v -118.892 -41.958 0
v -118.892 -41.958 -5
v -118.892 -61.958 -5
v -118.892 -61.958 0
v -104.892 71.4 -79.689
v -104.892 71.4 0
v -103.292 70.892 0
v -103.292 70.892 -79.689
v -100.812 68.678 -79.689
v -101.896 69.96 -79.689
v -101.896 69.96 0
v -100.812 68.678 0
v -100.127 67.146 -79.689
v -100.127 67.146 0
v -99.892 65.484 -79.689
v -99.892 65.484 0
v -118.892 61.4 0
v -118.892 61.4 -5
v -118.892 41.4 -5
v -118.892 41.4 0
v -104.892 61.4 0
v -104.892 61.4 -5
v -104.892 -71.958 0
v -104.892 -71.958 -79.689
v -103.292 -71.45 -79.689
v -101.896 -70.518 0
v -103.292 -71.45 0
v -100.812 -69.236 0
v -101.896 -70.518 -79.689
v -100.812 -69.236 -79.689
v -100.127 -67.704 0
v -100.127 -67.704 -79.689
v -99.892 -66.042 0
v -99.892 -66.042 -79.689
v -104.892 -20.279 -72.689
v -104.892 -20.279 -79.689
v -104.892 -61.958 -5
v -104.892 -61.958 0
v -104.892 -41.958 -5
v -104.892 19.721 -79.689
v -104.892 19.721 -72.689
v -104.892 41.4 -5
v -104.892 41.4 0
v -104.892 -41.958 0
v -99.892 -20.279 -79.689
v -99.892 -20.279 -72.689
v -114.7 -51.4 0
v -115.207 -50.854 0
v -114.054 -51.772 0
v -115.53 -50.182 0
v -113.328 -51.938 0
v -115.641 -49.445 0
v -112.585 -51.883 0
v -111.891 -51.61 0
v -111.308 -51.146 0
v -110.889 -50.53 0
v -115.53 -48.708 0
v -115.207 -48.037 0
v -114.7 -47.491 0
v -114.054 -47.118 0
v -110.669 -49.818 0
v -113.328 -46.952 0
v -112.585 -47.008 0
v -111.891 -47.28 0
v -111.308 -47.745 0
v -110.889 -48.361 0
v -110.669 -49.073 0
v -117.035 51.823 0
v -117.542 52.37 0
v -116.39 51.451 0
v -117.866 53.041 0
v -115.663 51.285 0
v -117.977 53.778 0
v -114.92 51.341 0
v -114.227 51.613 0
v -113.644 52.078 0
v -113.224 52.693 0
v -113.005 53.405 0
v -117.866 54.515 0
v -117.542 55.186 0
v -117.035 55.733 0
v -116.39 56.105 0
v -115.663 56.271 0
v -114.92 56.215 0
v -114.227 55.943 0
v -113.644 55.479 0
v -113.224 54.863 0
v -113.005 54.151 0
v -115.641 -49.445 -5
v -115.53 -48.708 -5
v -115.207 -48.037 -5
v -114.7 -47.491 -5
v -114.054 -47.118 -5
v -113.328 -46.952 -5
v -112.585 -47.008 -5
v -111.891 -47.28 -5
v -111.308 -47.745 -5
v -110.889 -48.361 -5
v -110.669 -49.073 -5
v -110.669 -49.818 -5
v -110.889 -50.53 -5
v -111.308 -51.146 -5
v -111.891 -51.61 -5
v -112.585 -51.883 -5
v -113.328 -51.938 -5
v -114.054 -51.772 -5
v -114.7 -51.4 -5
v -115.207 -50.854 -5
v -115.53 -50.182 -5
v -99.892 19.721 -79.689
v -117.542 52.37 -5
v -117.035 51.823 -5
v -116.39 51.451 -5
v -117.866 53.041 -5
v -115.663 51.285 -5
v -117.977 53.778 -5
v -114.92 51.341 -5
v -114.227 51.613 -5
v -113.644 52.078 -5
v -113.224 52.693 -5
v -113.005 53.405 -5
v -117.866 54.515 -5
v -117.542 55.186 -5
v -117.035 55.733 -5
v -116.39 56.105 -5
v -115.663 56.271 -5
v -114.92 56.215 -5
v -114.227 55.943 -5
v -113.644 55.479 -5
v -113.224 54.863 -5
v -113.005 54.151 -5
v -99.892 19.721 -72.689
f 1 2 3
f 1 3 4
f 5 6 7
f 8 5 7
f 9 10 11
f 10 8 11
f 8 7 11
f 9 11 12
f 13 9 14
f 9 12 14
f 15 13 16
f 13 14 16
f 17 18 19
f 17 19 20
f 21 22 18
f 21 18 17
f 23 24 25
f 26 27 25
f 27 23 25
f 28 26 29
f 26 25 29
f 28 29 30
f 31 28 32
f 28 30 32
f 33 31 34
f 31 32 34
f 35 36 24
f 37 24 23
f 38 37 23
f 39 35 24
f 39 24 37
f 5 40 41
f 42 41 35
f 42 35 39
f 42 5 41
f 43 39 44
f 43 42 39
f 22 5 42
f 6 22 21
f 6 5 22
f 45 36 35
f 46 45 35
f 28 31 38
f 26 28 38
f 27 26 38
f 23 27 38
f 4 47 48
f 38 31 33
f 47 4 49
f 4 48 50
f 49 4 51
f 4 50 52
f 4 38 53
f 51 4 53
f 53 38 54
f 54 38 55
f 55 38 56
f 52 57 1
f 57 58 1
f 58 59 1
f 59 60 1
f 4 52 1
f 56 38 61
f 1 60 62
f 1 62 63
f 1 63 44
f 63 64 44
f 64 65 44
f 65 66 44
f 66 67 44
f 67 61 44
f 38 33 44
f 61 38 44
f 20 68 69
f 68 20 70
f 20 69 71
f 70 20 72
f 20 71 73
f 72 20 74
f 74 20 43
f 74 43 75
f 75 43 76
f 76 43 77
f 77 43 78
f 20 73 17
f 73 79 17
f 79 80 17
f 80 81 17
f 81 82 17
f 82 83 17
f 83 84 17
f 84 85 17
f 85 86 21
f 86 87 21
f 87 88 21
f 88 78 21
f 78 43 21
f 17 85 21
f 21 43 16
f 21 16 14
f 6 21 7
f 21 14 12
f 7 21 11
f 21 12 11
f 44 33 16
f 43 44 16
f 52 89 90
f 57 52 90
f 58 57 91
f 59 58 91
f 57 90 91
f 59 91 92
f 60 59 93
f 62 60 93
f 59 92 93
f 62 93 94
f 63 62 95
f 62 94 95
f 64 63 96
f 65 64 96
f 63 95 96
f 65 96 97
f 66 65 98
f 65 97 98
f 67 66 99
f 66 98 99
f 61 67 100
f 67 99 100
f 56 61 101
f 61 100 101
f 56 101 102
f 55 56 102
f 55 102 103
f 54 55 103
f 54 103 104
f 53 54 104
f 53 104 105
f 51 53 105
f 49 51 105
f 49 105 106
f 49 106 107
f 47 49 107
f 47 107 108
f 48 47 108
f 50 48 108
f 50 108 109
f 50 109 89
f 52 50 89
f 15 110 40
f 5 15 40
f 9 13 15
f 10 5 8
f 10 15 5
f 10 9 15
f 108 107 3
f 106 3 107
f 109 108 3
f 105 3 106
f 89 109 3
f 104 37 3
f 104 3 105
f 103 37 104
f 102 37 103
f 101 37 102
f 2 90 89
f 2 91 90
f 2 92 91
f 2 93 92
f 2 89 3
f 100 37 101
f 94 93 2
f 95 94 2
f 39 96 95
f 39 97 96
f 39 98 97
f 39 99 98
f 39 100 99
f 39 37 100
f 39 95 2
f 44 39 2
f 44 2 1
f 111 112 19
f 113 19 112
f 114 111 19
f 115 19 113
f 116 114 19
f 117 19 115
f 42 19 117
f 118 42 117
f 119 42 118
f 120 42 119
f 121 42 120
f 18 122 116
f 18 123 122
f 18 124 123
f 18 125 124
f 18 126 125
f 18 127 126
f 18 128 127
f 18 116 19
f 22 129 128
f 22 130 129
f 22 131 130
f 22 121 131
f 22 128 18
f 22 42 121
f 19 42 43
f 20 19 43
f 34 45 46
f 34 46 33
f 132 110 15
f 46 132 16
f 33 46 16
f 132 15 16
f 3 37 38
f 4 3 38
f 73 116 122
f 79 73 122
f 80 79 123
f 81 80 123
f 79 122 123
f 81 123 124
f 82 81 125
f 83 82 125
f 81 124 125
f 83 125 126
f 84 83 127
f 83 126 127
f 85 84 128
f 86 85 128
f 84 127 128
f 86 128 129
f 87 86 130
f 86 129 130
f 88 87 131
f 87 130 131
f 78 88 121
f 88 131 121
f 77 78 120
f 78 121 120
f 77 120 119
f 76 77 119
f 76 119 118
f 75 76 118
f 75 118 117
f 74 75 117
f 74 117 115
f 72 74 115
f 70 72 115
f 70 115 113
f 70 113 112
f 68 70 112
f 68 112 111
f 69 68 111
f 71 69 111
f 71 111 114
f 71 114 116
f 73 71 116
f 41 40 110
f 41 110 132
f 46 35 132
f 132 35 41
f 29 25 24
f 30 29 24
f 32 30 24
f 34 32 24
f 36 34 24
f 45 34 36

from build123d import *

# Parameters (mm, degrees)
CROQUIS2_W              = 200
CROQUIS2_H              = 150
CROQUIS2_R              = 2
CROQUIS2_R_2            = 2.5
CROQUIS2_W_2            = 31.297292299
CROQUIS2_H_2            = 43.768728426
CROQUIS2_H_3            = 43.768728427
CROQUIS2_W_3            = 23.573907934
CROQUIS2_H_4            = 45.323962431
SALIENTE_EXTRUIR1_DEPTH = 2
REDONDEO1_R             = 10
BOSS_EXTRUDE1_DEPTH     = 25
SKETCH3_W               = 62.040442094
SKETCH3_H               = 5.530821024
BOSS_EXTRUDE2_DEPTH     = 22
SKETCH8_W               = 62.040442094
SKETCH8_H               = 5.530821024
BOSS_EXTRUDE6_DEPTH     = 13
SKETCH2_W               = 200
SKETCH2_H               = 78.124132015
SKETCH2_W_2             = 62.040442094
SKETCH2_H_2             = 5.530821024
BOSS_EXTRUDE3_DEPTH     = 5
SKETCH4_W               = 62.040442094
SKETCH4_H               = 5.530821024
BOSS_EXTRUDE4_DEPTH     = 19
SKETCH5_W               = 7.442573222
SKETCH5_H               = 2.991451355
BOSS_EXTRUDE5_DEPTH     = 21
SKETCH6_R               = 2.5
CUT_EXTRUDE1_DEPTH      = 158.961544101
FILLET1_R               = 10
SKETCH10_W              = 79.68896036
SKETCH10_H              = 143.358595358
BOSS_EXTRUDE7_DEPTH     = 5
SKETCH11_W              = 5
SKETCH11_H              = 20
BOSS_EXTRUDE13_DEPTH    = 14
SKETCH12_R              = 2.5
CUT_EXTRUDE2_DEPTH      = 176.118897221
FILLET2_R               = 6
CUT_EXTRUDE3_DEPTH      = 222.270727407
SKETCH14_W              = 12
SKETCH14_H              = 2
CUT_EXTRUDE4_DEPTH      = 198.082327879
SKETCH15_W              = 7
SKETCH15_H              = 40
CUT_EXTRUDE5_DEPTH      = 10


with BuildPart() as part:
    # Croquis2 → Saliente-Extruir1 (new body)
    with BuildSketch(Plane.XY):
        with Locations((0.108263467, -0.36008145)):
            Rectangle(CROQUIS2_W, CROQUIS2_H)
        with Locations((89.108263467, -66.5)):
            Circle(CROQUIS2_R, mode=Mode.SUBTRACT)
        with Locations((-88.891736533, -66.5)):
            Circle(CROQUIS2_R, mode=Mode.SUBTRACT)
        with Locations(Location((89.108263467, 65.779837101, 0), (0, 0, 180))):
            Circle(CROQUIS2_R, mode=Mode.SUBTRACT)
        with Locations(Location((-88.891736533, 65.779837101, 0), (0, 0, 180))):
            Circle(CROQUIS2_R, mode=Mode.SUBTRACT)
        with Locations((-80.865436179, -59.36008145)):
            Circle(CROQUIS2_R_2, mode=Mode.SUBTRACT)
        with Locations((81.108263467, -59.36008145)):
            Circle(CROQUIS2_R_2, mode=Mode.SUBTRACT)
        with Locations(Location((81.108263467, 58.63991855, 0), (0, 0, 180))):
            Circle(CROQUIS2_R_2, mode=Mode.SUBTRACT)
        with Locations(Location((-80.865436179, 58.63991855, 0), (0, 0, 180))):
            Circle(CROQUIS2_R_2, mode=Mode.SUBTRACT)
        with BuildLine():
            Line((-62.091736533, 70.63991855), (64.108263467, 70.63991855))
            ThreePointArc((64.108263467, 70.63991855), (66.108263467, 68.63991855), (64.108263467, 66.63991855))
            Line((64.108263467, 66.63991855), (-62.091736533, 66.63991855))
            ThreePointArc((-62.091736533, 66.63991855), (-64.091736533, 68.63991855), (-62.091736533, 70.63991855))
        make_face(mode=Mode.SUBTRACT)
        Polygon((-71.391736533, -12.902447307), (-71.391736533, 12.182284408), (-79.241736533, 12.28991855), (-83.891736533, 12.28991855), (-83.891736533, -13.01008145), (-79.241736533, -13.01008145), align=None, mode=Mode.SUBTRACT)
        with BuildLine():
            Line((92.108263467, 45.478381757), (92.108263467, -46.198544657))
            ThreePointArc((92.108263467, -46.198544657), (90.807295546, -47.897576736), (89.108263467, -46.596608814))
            Line((89.108263467, -46.596608814), (89.108263467, 45.876445915))
            ThreePointArc((89.108263467, 45.876445915), (90.807295546, 47.177413836), (92.108263467, 45.478381757))
        make_face(mode=Mode.SUBTRACT)
        Polygon((84.108263467, 12.28991855), (84.108263467, -13.01008145), (79.458263467, -13.01008145), (71.608263467, -13.01008145), (71.608263467, 12.28991855), (79.458263467, 12.28991855), align=None, mode=Mode.SUBTRACT)
        with BuildLine():
            Line((-91.891736533, 45.478381757), (-91.891736533, -46.198544657))
            ThreePointArc((-91.891736533, -46.198544657), (-90.590768612, -47.897576736), (-88.891736533, -46.596608814))
            Line((-88.891736533, -46.596608814), (-88.891736533, 45.876445915))
            ThreePointArc((-88.891736533, 45.876445915), (-90.590768612, 47.177413836), (-91.891736533, 45.478381757))
        make_face(mode=Mode.SUBTRACT)
        with Locations((-30.011405388, 36.299005811)):
            Rectangle(CROQUIS2_W_2, CROQUIS2_H_2, mode=Mode.SUBTRACT)
        with BuildLine():
            Line((-62.091736533, -71.36008145), (64.108263467, -71.36008145))
            ThreePointArc((64.108263467, -71.36008145), (66.108263467, -69.36008145), (64.108263467, -67.36008145))
            Line((64.108263467, -67.36008145), (-62.091736533, -67.36008145))
            ThreePointArc((-62.091736533, -67.36008145), (-64.091736533, -69.36008145), (-62.091736533, -71.36008145))
        make_face(mode=Mode.SUBTRACT)
        with Locations((-30.011405388, -26.799059535)):
            Rectangle(CROQUIS2_W_2, CROQUIS2_H_3, mode=Mode.SUBTRACT)
        with Locations((12.982877294, -0.693345879)):
            Rectangle(CROQUIS2_W_3, CROQUIS2_H_4, mode=Mode.SUBTRACT)
    extrude(amount=SALIENTE_EXTRUIR1_DEPTH)

    # Redondeo1
    redondeo1_edges = [part.edges().sort_by_distance(p)[0] for p in [
        (100.108263467, -75.36008145, 1),
        (-99.891736533, -75.36008145, 1),
        (-99.891736533, 74.63991855, 1),
        (100.108263467, 74.63991855, 1),
    ]]
    fillet(redondeo1_edges, radius=REDONDEO1_R)

    # Sketch1 → Boss-Extrude1 (add)
    with BuildSketch(Plane.XY.offset(2)):
        Polygon((-67.071845217, 64.63991855), (-67.071845217, 60.63991855), (-8.841198185, 60.63991855), (-8.841198185, 3.63991855), (-67.071845217, 3.63991855), (-67.071845217, -0.36008145), (-8.841198185, -0.36008145), (-8.841198185, -53.36008145), (-67.071845217, -53.36008145), (-67.071845217, -57.574734434), (-5.031403123, -57.574734434), (-5.031403123, -40.931443482), (46.608263467, -40.931443482), (46.608263467, -36.931443482), (-5.031403123, -36.931443482), (-5.031403123, 30.068556518), (46.608263467, 30.068556518), (46.608263467, 34.068556518), (-5.031403123, 34.068556518), (-5.031403123, 64.63991855), align=None)
    extrude(amount=BOSS_EXTRUDE1_DEPTH)

    # Sketch3 → Boss-Extrude2 (add)
    with BuildSketch(Plane.XZ.offset(57.574734434)):
        with Locations((-36.05162417, 24.234589488)):
            Rectangle(SKETCH3_W, SKETCH3_H)
    extrude(amount=BOSS_EXTRUDE2_DEPTH)

    # Sketch8 → Boss-Extrude6 (add)
    with BuildSketch(Plane(origin=(0, 64.63991855, 0), x_dir=(1, 0, 0), z_dir=(0, 1, 0))):
        with Locations((-36.05162417, -24.234589488)):
            Rectangle(SKETCH8_W, SKETCH8_H)
    extrude(amount=BOSS_EXTRUDE6_DEPTH)

    # Sketch2 → Boss-Extrude3 (add)
    with BuildSketch(Plane.XZ.offset(75.36008145)):
        with Locations((0.108263467, 41.062066008)):
            Rectangle(SKETCH2_W, SKETCH2_H)
        with Locations((-36.05162417, 24.234589488)):
            Rectangle(SKETCH2_W_2, SKETCH2_H_2, mode=Mode.SUBTRACT)
    extrude(amount=-BOSS_EXTRUDE3_DEPTH)

    # Sketch4 → Boss-Extrude4 (add)
    with BuildSketch(Plane(origin=(0, 64.63991855, 0), x_dir=(1, 0, 0), z_dir=(0, 1, 0))):
        with Locations((-36.05162417, -24.234589488)):
            Rectangle(SKETCH4_W, SKETCH4_H)
    extrude(amount=BOSS_EXTRUDE4_DEPTH)

    # Sketch5 → Boss-Extrude5 (add)
    with BuildSketch(Plane.XZ.offset(75.36008145)):
        with Locations((-80.540187187, 3.495725678)):
            Rectangle(SKETCH5_W, SKETCH5_H)
        with Locations((80.756714122, 3.495725678)):
            Rectangle(SKETCH5_W, SKETCH5_H)
    extrude(amount=BOSS_EXTRUDE5_DEPTH)

    # Sketch6 → Cut-Extrude1 (cut, through all)
    with BuildSketch(Plane.XY.offset(4.991451355)):
        with Locations((-80.996023003, -59.284349751)):
            Circle(SKETCH6_R)
        with Locations((81.166025964, -59.051385225)):
            Circle(SKETCH6_R)
    extrude(amount=-CUT_EXTRUDE1_DEPTH, mode=Mode.SUBTRACT)

    # Fillet1
    # the kernel refuses this fillet: 10 mm, written as the material it takes off along each edge
    with BuildSketch(Plane(origin=(100.108263467, -70.36008145, 2), x_dir=(-1, 0, 0), z_dir=(0, 0, 1)), Plane(origin=(-99.891736533, -70.36008145, 101.77476711), x_dir=(1, 0, 0), z_dir=(0, 0, -1))) as fillet1_piece_1:
        with BuildLine():
            CenterArc((8.660254038, 10), FILLET1_R, 210, 60)
            Line((0, 5), (0, 0))
            Line((0, 0), (8.660254038, 0))
        make_face()
    extrude(amount=99.77476711, mode=Mode.SUBTRACT)


with BuildPart() as body_2:
    # Sketch10 → Boss-Extrude7 (new body)
    with BuildSketch(Plane.ZY.offset(99.891736533)):
        with Locations((-39.84448018, -0.278985798)):
            Rectangle(SKETCH10_W, SKETCH10_H)
    extrude(amount=BOSS_EXTRUDE7_DEPTH)

    # Sketch11 → Boss-Extrude13 (add)
    with BuildSketch(Plane.ZY.offset(104.891736533)):
        with Locations((-2.5, -51.958283477)):
            Rectangle(SKETCH11_W, SKETCH11_H)
        with Locations((-2.5, 51.400311881)):
            Rectangle(SKETCH11_W, SKETCH11_H)
    extrude(amount=BOSS_EXTRUDE13_DEPTH)


with BuildPart() as cut_extrude2_tool:
    # Sketch12 → Cut-Extrude2 (new, through all)
    with BuildSketch(Plane(origin=(0, 0, -5), x_dir=(-1, 0, 0), z_dir=(0, 0, -1))):
        with Locations((94.306850379, -54.336044589)):
            Circle(SKETCH12_R)
        with Locations((94.306850379, 53.778072993)):
            Circle(SKETCH12_R)
        with Locations((115.476622686, 53.778072993)):
            Circle(SKETCH12_R)
        with Locations((113.140977594, -49.445291065)):
            Circle(SKETCH12_R)
    extrude(amount=-CUT_EXTRUDE2_DEPTH)


with BuildPart() as part_1:
    add(part.part)

    # Cut-Extrude2: cut by cut_extrude2_tool
    add(cut_extrude2_tool.part, mode=Mode.SUBTRACT)

    # Sketch13 → Cut-Extrude3 (cut, through all)
    with BuildSketch(Plane.XY.offset(80.124132015)):
        Polygon((-88.891736533, 41.400311881), (-87.891736533, 41.400311881), (-87.891736533, 63.52554782), (-99.891736533, 63.52554782), (-99.891736533, 94.010082764), (108.48763668, 94.010082764), (108.48763668, -102.123784964), (-99.891736533, -102.123784964), (-99.891736533, -61.922986139), (-88.478309969, -61.922986139), (-88.478309969, -40.956005085), (-99.891736533, -40.956005085), (-99.891736533, 41.400311881), align=None)
    extrude(amount=-CUT_EXTRUDE3_DEPTH, mode=Mode.SUBTRACT)


with BuildPart() as body_2_1:
    add(body_2.part)

    # Cut-Extrude2: cut by cut_extrude2_tool
    add(cut_extrude2_tool.part, mode=Mode.SUBTRACT)

    # Fillet2
    # the kernel refuses this fillet: 6 mm, written as the material it takes off along each edge
    with BuildSketch(Plane(origin=(-99.891736533, -71.958283477, -94.479159818), x_dir=(0, 1, 0), z_dir=(0, 0, 1))) as fillet2_piece_1:
        with BuildLine():
            CenterArc((5.916079783, 6), FILLET2_R, 189.594068227, 80.405931773)
            Line((0, 5), (-0.118321596, 4.98))
            ThreePointArc((-0.118321596, 4.98), (-0.12, 2.5), (-0.12, 0))
            Line((-0.12, 0), (0, -0.12))
            Line((0, -0.12), (5.916079783, -0.12))
            Line((5.916079783, -0.12), (5.916079783, 0))
        make_face()
    extrude(amount=109.269359275, mode=Mode.SUBTRACT)
    with BuildSketch(Plane(origin=(-99.891736533, 71.400311881, 14.790199458), x_dir=(-1, 0, 0), z_dir=(0, 0, -1))) as fillet2_piece_2:
        with BuildLine():
            CenterArc((6, -5.916079783), FILLET2_R, 99.594068227, 80.405931773)
            Line((0, -5.916079783), (-0.12, -5.916079783))
            Line((-0.12, -5.916079783), (-0.12, 0))
            Line((-0.12, 0), (0, 0.12))
            ThreePointArc((0, 0.12), (2.5, 0.12), (4.98, 0.118321596))
            Line((4.98, 0.118321596), (5, 0))
        make_face()
    extrude(amount=109.269359275, mode=Mode.SUBTRACT)

    # Sketch15 → Cut-Extrude5 (cut)
    with BuildSketch(Plane.ZY.offset(104.891736533)):
        with Locations((-76.18896036, -0.278985798)):
            Rectangle(SKETCH15_W, SKETCH15_H)
    extrude(amount=-CUT_EXTRUDE5_DEPTH, mode=Mode.SUBTRACT)


with BuildPart() as cut_extrude3_piece_1:
    # of the separate pieces the step leaves, piece 1, a body of its own (cut_extrude3_pieces)
    add(part_1.part.solids().sort_by_distance((-99.891736533, 63.52554782, 0))[0])


with BuildPart() as cut_extrude3_piece_2:
    # of the separate pieces the step leaves, piece 2, a body of its own (cut_extrude3_pieces)
    add(part_1.part.solids().sort_by_distance((-99.891736533, -40.956005085, 0))[0])


with BuildPart() as cut_extrude4_tool:
    # Sketch14 → Cut-Extrude4 (new, through all)
    with BuildSketch(Plane(origin=(0, 63.52554782, 0), x_dir=(1, 0, 0), z_dir=(0, 1, 0))):
        with Locations((-93.891736533, -1)):
            Rectangle(SKETCH14_W, SKETCH14_H)
    extrude(amount=-CUT_EXTRUDE4_DEPTH)


with BuildPart() as cut_extrude3_piece_1_1:
    add(cut_extrude3_piece_1.part)

    # Cut-Extrude4: cut by cut_extrude4_tool
    add(cut_extrude4_tool.part, mode=Mode.SUBTRACT)


with BuildPart() as cut_extrude3_piece_2_1:
    add(cut_extrude3_piece_2.part)

    # Cut-Extrude4: cut by cut_extrude4_tool
    add(cut_extrude4_tool.part, mode=Mode.SUBTRACT)


solid = body_2_1.part
